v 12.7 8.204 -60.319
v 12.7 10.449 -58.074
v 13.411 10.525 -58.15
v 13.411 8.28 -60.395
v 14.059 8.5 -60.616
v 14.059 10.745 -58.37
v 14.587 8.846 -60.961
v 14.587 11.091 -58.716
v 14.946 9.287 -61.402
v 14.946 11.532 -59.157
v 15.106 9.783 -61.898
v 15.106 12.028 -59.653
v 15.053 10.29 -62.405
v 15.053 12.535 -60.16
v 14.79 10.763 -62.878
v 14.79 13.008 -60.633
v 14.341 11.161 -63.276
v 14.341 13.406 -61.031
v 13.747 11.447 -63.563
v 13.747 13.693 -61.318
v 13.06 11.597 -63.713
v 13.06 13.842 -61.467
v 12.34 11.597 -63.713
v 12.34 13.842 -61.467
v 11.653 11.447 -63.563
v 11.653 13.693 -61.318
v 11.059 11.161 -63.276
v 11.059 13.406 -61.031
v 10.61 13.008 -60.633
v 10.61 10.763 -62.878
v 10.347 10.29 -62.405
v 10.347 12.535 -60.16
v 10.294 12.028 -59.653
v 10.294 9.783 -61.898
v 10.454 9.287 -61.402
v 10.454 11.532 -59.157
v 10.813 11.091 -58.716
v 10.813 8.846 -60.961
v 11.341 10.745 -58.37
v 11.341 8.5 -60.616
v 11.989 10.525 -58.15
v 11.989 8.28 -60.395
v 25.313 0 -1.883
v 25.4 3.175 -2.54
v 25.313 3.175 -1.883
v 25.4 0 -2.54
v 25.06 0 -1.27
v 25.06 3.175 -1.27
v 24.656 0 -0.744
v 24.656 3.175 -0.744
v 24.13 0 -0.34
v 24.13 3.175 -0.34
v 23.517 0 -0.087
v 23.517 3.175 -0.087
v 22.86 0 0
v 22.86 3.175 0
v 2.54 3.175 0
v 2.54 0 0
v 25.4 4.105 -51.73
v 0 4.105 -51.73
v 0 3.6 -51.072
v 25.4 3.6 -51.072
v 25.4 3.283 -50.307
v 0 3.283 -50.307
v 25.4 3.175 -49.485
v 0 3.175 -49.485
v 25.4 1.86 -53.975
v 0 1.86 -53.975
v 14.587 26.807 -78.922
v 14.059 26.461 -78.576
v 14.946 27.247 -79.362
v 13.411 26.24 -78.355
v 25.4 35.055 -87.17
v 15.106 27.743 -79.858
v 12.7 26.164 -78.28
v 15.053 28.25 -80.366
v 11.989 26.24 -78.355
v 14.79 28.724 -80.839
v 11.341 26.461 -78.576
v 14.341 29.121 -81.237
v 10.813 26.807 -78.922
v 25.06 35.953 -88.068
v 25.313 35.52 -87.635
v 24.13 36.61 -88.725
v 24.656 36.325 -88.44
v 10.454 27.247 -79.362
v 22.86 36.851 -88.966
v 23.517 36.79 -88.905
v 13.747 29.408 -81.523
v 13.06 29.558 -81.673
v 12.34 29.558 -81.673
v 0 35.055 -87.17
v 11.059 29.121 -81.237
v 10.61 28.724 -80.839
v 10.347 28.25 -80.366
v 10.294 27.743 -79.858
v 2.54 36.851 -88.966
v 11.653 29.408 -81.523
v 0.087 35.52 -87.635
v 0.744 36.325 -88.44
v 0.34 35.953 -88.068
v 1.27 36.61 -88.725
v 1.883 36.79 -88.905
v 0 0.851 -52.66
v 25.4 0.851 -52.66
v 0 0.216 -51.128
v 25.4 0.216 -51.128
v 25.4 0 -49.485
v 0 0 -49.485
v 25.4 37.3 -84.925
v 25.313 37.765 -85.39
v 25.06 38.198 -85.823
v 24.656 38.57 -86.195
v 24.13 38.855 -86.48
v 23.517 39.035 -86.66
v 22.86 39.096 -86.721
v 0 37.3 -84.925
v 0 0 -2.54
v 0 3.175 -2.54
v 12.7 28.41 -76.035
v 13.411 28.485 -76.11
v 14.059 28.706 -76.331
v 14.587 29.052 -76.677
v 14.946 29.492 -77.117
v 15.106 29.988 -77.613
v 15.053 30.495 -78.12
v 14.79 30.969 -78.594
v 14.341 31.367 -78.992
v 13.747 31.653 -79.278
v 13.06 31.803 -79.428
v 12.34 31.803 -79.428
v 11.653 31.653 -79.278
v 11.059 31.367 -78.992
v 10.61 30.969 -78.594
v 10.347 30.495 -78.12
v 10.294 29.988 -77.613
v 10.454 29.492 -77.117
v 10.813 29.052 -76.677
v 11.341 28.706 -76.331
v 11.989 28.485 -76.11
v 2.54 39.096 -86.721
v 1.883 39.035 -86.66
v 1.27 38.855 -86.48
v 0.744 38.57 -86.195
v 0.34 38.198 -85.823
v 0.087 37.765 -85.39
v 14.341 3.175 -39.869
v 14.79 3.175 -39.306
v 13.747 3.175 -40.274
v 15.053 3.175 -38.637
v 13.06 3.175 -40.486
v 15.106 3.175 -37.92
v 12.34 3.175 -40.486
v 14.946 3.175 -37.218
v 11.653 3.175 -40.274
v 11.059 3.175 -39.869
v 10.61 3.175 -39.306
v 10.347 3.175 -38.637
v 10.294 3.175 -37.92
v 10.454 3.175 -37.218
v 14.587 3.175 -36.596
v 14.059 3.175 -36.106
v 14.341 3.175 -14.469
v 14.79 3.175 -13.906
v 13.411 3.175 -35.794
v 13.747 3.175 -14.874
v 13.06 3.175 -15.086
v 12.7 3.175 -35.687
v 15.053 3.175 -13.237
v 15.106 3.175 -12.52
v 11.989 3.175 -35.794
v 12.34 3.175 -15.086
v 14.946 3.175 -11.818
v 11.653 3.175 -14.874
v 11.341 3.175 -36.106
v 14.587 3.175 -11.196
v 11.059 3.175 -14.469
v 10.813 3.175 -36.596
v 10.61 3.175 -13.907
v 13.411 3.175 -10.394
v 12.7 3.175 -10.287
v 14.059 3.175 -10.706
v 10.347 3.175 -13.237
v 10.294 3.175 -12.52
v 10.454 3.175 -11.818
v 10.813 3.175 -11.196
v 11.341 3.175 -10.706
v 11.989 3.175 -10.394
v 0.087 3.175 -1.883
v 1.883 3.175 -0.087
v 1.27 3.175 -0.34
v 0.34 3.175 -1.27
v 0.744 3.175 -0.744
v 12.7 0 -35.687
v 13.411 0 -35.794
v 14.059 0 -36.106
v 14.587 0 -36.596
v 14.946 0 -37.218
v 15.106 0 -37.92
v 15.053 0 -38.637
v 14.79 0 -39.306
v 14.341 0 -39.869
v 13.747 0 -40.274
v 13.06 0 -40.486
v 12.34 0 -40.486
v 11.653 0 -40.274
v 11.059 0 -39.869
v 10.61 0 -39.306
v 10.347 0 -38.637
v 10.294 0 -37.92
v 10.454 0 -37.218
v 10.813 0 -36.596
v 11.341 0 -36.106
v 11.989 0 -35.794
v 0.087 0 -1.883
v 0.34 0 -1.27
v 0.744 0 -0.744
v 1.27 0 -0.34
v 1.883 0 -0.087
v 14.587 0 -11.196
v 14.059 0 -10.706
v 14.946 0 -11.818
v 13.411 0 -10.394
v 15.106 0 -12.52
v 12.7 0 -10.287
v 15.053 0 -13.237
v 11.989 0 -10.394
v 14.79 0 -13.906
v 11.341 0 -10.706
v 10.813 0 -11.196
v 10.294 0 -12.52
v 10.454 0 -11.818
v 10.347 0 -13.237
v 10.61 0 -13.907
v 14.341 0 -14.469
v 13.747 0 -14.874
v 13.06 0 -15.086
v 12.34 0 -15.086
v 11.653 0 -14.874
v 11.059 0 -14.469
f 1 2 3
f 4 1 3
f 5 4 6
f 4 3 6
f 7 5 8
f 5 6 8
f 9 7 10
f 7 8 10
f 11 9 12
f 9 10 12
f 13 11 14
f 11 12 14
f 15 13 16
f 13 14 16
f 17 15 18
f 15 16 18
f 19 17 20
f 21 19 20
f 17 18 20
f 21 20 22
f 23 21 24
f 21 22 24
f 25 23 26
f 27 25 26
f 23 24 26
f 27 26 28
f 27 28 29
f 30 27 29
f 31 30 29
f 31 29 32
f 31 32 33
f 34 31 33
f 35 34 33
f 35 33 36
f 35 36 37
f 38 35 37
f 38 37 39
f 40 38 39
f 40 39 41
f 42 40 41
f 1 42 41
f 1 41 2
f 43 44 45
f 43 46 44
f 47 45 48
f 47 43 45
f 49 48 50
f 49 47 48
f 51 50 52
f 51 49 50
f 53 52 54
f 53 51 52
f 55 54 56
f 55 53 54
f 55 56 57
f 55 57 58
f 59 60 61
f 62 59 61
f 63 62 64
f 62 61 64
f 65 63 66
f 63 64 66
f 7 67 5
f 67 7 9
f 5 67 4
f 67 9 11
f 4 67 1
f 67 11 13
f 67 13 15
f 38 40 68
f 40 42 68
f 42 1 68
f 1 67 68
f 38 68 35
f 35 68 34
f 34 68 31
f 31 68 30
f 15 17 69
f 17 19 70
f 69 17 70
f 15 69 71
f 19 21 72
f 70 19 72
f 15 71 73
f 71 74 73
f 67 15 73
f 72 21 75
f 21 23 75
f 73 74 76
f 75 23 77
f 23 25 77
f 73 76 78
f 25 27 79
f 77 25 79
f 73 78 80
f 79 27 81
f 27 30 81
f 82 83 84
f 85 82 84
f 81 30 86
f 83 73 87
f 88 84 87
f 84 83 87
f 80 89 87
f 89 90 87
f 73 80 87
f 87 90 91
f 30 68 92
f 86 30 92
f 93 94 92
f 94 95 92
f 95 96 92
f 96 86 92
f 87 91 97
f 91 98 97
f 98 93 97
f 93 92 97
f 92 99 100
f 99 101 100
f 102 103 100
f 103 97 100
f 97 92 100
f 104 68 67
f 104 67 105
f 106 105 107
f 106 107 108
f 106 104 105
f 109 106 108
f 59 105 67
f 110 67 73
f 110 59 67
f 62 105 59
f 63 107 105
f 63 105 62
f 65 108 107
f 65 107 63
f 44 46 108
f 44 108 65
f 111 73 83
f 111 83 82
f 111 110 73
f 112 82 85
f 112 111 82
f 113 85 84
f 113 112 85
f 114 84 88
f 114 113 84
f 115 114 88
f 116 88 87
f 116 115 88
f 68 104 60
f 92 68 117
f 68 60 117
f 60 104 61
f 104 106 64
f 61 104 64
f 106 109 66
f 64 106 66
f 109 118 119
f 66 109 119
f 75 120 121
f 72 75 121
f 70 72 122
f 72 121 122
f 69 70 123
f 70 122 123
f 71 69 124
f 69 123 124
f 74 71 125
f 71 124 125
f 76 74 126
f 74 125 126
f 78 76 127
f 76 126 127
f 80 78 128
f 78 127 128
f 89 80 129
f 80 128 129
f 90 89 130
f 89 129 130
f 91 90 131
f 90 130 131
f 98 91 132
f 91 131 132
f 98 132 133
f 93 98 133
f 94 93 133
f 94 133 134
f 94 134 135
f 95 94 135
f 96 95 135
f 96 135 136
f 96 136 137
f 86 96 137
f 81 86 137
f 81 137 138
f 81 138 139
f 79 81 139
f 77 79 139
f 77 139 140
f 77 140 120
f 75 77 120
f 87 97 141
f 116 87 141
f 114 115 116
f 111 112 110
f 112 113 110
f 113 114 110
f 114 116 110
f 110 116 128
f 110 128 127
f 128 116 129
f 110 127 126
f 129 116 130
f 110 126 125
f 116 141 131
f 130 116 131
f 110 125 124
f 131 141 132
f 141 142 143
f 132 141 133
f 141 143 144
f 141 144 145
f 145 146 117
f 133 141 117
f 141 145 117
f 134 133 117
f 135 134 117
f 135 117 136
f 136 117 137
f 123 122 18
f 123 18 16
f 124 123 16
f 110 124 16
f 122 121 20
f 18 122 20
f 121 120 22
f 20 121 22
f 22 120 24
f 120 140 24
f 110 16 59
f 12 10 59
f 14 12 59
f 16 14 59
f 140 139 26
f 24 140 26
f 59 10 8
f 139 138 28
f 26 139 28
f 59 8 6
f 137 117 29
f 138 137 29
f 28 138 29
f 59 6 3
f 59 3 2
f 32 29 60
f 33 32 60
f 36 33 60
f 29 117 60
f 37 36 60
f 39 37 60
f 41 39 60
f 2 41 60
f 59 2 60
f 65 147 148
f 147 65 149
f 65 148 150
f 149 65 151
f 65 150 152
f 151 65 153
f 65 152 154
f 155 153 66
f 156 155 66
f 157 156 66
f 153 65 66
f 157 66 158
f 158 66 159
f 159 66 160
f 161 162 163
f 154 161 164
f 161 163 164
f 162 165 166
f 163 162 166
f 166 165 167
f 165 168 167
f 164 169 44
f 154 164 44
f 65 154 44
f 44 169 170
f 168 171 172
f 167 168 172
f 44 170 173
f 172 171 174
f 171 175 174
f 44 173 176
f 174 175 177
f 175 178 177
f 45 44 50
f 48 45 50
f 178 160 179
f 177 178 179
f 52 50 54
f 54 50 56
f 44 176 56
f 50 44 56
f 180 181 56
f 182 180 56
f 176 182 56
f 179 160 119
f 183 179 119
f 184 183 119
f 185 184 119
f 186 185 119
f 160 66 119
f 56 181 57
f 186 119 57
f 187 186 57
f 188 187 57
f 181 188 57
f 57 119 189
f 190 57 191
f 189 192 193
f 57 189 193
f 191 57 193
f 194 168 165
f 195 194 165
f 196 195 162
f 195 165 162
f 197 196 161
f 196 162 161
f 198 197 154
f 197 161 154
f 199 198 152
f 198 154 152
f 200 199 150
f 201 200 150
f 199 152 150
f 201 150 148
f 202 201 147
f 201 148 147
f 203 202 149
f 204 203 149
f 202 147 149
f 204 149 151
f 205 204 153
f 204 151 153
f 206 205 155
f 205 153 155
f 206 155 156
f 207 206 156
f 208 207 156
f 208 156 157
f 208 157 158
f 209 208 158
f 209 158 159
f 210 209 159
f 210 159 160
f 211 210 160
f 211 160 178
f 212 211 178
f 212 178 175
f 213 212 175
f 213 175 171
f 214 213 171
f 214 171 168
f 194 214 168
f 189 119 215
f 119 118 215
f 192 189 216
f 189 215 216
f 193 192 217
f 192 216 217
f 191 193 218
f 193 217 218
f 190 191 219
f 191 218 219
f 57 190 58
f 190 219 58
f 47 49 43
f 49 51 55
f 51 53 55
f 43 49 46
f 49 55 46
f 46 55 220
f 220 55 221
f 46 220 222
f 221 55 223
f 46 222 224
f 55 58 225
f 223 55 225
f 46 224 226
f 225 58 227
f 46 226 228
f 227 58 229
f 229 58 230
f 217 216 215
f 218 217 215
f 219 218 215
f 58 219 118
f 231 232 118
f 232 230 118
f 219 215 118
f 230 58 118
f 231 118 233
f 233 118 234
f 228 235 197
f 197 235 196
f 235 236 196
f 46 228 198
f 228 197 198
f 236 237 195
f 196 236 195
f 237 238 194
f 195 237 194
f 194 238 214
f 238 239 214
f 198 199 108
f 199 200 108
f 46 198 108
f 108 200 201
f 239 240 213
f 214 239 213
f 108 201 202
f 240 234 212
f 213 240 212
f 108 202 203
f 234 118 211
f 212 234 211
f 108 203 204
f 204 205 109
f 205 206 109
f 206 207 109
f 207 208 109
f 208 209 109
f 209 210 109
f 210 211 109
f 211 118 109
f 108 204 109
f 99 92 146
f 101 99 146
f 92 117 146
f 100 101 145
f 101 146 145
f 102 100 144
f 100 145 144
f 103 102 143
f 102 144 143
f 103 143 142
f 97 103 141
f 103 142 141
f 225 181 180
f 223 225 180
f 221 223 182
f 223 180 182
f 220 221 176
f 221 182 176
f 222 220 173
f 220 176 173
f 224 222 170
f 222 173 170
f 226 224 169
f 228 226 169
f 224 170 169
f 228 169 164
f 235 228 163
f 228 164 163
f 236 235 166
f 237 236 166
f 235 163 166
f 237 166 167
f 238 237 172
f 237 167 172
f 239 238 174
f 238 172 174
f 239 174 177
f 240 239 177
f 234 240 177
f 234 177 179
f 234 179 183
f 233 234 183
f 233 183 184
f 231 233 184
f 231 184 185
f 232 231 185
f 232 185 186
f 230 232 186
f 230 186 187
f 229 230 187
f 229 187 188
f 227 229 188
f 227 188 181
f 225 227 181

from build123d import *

# Parameters (mm, degrees)
BOSS_EXTRUDE1_DEPTH    = 25.4
CUT_EXTRUDE1_REACH     = 101.249
SKETCH2_R              = 2.413
CUT_EXTRUDE2_REACH     = 96.062
SKETCH3_R              = 2.413
CONVERT_SOLID1_DEPTH   = 25.4
CONVERT_SOLID1_2_DEPTH = 25.4
FILLET1_R              = 2.54


# Read off the part's stored shape, not the designer's step: Convert-Solid1
with BuildPart() as part:
    # Sketch1 → Boss-Extrude1 (new body)
    with BuildSketch(Plane(origin=(0, 0, 0), x_dir=(0, 0, -1), z_dir=(1, 0, 0))):
        Polygon((0, 0), (52.115128061, 0), (88.966088515, 36.850960454), (86.721024484, 39.096024484), (50.8, 3.175), (0, 3.175), align=None)
    extrude(amount=BOSS_EXTRUDE1_DEPTH)

    # Sketch2 → Cut-Extrude1 (cut, up to next)
    with BuildSketch(Plane(origin=(0, 3.175, 0), x_dir=(1, 0, 0), z_dir=(0, 1, 0)), mode=Mode.PRIVATE) as cut_extrude1_sk1:
        with Locations(Location((12.7, 12.7, 0), (0, 0, 270))):
            Circle(SKETCH2_R)
    cut_extrude1_tool1 = extrude(cut_extrude1_sk1.sketch, amount=-CUT_EXTRUDE1_REACH, mode=Mode.PRIVATE) & part.part
    # Sketch2 → Cut-Extrude1 (cut, up to next)
    with BuildSketch(Plane(origin=(0, 3.175, 0), x_dir=(1, 0, 0), z_dir=(0, 1, 0)), mode=Mode.PRIVATE) as cut_extrude1_sk2:
        with Locations(Location((12.7, 38.1, 0), (0, 0, 270))):
            Circle(SKETCH2_R)
    cut_extrude1_tool2 = extrude(cut_extrude1_sk2.sketch, amount=-CUT_EXTRUDE1_REACH, mode=Mode.PRIVATE) & part.part
    add(cut_extrude1_tool1.solids().sort_by_distance((12.7, 3.175, -12.7))[0], mode=Mode.SUBTRACT)
    add(cut_extrude1_tool2.solids().sort_by_distance((12.7, 3.175, -38.1))[0], mode=Mode.SUBTRACT)

    # Sketch3 → Cut-Extrude2 (cut, up to next)
    with BuildSketch(Plane(origin=(0, -23.8125, -23.8125), x_dir=(1, 0, 0), z_dir=(0, 0.707106781186546, 0.707106781186549)), mode=Mode.PRIVATE) as cut_extrude2_sk1:
        with Locations(Location((12.7, 76.266088515, 0), (0, 0, 270))):
            Circle(SKETCH3_R)
    cut_extrude2_tool1 = extrude(cut_extrude2_sk1.sketch, amount=-CUT_EXTRUDE2_REACH, mode=Mode.PRIVATE) & part.part
    # Sketch3 → Cut-Extrude2 (cut, up to next)
    with BuildSketch(Plane(origin=(0, -23.8125, -23.8125), x_dir=(1, 0, 0), z_dir=(0, 0.707106781186546, 0.707106781186549)), mode=Mode.PRIVATE) as cut_extrude2_sk2:
        with Locations(Location((12.7, 50.866088515, 0), (0, 0, 270))):
            Circle(SKETCH3_R)
    cut_extrude2_tool2 = extrude(cut_extrude2_sk2.sketch, amount=-CUT_EXTRUDE2_REACH, mode=Mode.PRIVATE) & part.part
    add(cut_extrude2_tool1.solids().sort_by_distance((12.7, 30.115768, -77.740768))[0], mode=Mode.SUBTRACT)
    add(cut_extrude2_tool2.solids().sort_by_distance((12.7, 12.155256, -59.780256))[0], mode=Mode.SUBTRACT)

    # Convert-Solid1 outline → Convert-Solid1 (cut)
    with BuildSketch(Plane.YZ):
        with BuildLine():
            Line((0, -52.115128061), (1.859871939, -53.975))
            ThreePointArc((1.859871939, -53.975), (0.483364969, -51.914911734), (0, -49.484871939))
            Line((0, -49.484871939), (0, -52.115128061))
        make_face()
    extrude(amount=CONVERT_SOLID1_DEPTH, mode=Mode.SUBTRACT)

    # Convert-Solid1 2 outline → Convert-Solid1 2 (add)
    with BuildSketch(Plane.YZ):
        with BuildLine():
            Line((3.175, -50.8), (4.10493597, -51.72993597))
            ThreePointArc((4.10493597, -51.72993597), (3.416682484, -50.699891837), (3.175, -49.484871939))
            Line((3.175, -49.484871939), (3.175, -50.8))
        make_face()
    extrude(amount=CONVERT_SOLID1_2_DEPTH)

    # Fillet1
    fillet1_edges = [part.edges().sort_by_distance(p)[0] for p in [
        (0, 1.5875, 0),
        (25.4, 1.5875, 0),
        (25.4, 37.973492469, -87.843556499),
        (0, 37.973492469, -87.843556499),
    ]]
    fillet(fillet1_edges, radius=FILLET1_R)


solid = part.part
